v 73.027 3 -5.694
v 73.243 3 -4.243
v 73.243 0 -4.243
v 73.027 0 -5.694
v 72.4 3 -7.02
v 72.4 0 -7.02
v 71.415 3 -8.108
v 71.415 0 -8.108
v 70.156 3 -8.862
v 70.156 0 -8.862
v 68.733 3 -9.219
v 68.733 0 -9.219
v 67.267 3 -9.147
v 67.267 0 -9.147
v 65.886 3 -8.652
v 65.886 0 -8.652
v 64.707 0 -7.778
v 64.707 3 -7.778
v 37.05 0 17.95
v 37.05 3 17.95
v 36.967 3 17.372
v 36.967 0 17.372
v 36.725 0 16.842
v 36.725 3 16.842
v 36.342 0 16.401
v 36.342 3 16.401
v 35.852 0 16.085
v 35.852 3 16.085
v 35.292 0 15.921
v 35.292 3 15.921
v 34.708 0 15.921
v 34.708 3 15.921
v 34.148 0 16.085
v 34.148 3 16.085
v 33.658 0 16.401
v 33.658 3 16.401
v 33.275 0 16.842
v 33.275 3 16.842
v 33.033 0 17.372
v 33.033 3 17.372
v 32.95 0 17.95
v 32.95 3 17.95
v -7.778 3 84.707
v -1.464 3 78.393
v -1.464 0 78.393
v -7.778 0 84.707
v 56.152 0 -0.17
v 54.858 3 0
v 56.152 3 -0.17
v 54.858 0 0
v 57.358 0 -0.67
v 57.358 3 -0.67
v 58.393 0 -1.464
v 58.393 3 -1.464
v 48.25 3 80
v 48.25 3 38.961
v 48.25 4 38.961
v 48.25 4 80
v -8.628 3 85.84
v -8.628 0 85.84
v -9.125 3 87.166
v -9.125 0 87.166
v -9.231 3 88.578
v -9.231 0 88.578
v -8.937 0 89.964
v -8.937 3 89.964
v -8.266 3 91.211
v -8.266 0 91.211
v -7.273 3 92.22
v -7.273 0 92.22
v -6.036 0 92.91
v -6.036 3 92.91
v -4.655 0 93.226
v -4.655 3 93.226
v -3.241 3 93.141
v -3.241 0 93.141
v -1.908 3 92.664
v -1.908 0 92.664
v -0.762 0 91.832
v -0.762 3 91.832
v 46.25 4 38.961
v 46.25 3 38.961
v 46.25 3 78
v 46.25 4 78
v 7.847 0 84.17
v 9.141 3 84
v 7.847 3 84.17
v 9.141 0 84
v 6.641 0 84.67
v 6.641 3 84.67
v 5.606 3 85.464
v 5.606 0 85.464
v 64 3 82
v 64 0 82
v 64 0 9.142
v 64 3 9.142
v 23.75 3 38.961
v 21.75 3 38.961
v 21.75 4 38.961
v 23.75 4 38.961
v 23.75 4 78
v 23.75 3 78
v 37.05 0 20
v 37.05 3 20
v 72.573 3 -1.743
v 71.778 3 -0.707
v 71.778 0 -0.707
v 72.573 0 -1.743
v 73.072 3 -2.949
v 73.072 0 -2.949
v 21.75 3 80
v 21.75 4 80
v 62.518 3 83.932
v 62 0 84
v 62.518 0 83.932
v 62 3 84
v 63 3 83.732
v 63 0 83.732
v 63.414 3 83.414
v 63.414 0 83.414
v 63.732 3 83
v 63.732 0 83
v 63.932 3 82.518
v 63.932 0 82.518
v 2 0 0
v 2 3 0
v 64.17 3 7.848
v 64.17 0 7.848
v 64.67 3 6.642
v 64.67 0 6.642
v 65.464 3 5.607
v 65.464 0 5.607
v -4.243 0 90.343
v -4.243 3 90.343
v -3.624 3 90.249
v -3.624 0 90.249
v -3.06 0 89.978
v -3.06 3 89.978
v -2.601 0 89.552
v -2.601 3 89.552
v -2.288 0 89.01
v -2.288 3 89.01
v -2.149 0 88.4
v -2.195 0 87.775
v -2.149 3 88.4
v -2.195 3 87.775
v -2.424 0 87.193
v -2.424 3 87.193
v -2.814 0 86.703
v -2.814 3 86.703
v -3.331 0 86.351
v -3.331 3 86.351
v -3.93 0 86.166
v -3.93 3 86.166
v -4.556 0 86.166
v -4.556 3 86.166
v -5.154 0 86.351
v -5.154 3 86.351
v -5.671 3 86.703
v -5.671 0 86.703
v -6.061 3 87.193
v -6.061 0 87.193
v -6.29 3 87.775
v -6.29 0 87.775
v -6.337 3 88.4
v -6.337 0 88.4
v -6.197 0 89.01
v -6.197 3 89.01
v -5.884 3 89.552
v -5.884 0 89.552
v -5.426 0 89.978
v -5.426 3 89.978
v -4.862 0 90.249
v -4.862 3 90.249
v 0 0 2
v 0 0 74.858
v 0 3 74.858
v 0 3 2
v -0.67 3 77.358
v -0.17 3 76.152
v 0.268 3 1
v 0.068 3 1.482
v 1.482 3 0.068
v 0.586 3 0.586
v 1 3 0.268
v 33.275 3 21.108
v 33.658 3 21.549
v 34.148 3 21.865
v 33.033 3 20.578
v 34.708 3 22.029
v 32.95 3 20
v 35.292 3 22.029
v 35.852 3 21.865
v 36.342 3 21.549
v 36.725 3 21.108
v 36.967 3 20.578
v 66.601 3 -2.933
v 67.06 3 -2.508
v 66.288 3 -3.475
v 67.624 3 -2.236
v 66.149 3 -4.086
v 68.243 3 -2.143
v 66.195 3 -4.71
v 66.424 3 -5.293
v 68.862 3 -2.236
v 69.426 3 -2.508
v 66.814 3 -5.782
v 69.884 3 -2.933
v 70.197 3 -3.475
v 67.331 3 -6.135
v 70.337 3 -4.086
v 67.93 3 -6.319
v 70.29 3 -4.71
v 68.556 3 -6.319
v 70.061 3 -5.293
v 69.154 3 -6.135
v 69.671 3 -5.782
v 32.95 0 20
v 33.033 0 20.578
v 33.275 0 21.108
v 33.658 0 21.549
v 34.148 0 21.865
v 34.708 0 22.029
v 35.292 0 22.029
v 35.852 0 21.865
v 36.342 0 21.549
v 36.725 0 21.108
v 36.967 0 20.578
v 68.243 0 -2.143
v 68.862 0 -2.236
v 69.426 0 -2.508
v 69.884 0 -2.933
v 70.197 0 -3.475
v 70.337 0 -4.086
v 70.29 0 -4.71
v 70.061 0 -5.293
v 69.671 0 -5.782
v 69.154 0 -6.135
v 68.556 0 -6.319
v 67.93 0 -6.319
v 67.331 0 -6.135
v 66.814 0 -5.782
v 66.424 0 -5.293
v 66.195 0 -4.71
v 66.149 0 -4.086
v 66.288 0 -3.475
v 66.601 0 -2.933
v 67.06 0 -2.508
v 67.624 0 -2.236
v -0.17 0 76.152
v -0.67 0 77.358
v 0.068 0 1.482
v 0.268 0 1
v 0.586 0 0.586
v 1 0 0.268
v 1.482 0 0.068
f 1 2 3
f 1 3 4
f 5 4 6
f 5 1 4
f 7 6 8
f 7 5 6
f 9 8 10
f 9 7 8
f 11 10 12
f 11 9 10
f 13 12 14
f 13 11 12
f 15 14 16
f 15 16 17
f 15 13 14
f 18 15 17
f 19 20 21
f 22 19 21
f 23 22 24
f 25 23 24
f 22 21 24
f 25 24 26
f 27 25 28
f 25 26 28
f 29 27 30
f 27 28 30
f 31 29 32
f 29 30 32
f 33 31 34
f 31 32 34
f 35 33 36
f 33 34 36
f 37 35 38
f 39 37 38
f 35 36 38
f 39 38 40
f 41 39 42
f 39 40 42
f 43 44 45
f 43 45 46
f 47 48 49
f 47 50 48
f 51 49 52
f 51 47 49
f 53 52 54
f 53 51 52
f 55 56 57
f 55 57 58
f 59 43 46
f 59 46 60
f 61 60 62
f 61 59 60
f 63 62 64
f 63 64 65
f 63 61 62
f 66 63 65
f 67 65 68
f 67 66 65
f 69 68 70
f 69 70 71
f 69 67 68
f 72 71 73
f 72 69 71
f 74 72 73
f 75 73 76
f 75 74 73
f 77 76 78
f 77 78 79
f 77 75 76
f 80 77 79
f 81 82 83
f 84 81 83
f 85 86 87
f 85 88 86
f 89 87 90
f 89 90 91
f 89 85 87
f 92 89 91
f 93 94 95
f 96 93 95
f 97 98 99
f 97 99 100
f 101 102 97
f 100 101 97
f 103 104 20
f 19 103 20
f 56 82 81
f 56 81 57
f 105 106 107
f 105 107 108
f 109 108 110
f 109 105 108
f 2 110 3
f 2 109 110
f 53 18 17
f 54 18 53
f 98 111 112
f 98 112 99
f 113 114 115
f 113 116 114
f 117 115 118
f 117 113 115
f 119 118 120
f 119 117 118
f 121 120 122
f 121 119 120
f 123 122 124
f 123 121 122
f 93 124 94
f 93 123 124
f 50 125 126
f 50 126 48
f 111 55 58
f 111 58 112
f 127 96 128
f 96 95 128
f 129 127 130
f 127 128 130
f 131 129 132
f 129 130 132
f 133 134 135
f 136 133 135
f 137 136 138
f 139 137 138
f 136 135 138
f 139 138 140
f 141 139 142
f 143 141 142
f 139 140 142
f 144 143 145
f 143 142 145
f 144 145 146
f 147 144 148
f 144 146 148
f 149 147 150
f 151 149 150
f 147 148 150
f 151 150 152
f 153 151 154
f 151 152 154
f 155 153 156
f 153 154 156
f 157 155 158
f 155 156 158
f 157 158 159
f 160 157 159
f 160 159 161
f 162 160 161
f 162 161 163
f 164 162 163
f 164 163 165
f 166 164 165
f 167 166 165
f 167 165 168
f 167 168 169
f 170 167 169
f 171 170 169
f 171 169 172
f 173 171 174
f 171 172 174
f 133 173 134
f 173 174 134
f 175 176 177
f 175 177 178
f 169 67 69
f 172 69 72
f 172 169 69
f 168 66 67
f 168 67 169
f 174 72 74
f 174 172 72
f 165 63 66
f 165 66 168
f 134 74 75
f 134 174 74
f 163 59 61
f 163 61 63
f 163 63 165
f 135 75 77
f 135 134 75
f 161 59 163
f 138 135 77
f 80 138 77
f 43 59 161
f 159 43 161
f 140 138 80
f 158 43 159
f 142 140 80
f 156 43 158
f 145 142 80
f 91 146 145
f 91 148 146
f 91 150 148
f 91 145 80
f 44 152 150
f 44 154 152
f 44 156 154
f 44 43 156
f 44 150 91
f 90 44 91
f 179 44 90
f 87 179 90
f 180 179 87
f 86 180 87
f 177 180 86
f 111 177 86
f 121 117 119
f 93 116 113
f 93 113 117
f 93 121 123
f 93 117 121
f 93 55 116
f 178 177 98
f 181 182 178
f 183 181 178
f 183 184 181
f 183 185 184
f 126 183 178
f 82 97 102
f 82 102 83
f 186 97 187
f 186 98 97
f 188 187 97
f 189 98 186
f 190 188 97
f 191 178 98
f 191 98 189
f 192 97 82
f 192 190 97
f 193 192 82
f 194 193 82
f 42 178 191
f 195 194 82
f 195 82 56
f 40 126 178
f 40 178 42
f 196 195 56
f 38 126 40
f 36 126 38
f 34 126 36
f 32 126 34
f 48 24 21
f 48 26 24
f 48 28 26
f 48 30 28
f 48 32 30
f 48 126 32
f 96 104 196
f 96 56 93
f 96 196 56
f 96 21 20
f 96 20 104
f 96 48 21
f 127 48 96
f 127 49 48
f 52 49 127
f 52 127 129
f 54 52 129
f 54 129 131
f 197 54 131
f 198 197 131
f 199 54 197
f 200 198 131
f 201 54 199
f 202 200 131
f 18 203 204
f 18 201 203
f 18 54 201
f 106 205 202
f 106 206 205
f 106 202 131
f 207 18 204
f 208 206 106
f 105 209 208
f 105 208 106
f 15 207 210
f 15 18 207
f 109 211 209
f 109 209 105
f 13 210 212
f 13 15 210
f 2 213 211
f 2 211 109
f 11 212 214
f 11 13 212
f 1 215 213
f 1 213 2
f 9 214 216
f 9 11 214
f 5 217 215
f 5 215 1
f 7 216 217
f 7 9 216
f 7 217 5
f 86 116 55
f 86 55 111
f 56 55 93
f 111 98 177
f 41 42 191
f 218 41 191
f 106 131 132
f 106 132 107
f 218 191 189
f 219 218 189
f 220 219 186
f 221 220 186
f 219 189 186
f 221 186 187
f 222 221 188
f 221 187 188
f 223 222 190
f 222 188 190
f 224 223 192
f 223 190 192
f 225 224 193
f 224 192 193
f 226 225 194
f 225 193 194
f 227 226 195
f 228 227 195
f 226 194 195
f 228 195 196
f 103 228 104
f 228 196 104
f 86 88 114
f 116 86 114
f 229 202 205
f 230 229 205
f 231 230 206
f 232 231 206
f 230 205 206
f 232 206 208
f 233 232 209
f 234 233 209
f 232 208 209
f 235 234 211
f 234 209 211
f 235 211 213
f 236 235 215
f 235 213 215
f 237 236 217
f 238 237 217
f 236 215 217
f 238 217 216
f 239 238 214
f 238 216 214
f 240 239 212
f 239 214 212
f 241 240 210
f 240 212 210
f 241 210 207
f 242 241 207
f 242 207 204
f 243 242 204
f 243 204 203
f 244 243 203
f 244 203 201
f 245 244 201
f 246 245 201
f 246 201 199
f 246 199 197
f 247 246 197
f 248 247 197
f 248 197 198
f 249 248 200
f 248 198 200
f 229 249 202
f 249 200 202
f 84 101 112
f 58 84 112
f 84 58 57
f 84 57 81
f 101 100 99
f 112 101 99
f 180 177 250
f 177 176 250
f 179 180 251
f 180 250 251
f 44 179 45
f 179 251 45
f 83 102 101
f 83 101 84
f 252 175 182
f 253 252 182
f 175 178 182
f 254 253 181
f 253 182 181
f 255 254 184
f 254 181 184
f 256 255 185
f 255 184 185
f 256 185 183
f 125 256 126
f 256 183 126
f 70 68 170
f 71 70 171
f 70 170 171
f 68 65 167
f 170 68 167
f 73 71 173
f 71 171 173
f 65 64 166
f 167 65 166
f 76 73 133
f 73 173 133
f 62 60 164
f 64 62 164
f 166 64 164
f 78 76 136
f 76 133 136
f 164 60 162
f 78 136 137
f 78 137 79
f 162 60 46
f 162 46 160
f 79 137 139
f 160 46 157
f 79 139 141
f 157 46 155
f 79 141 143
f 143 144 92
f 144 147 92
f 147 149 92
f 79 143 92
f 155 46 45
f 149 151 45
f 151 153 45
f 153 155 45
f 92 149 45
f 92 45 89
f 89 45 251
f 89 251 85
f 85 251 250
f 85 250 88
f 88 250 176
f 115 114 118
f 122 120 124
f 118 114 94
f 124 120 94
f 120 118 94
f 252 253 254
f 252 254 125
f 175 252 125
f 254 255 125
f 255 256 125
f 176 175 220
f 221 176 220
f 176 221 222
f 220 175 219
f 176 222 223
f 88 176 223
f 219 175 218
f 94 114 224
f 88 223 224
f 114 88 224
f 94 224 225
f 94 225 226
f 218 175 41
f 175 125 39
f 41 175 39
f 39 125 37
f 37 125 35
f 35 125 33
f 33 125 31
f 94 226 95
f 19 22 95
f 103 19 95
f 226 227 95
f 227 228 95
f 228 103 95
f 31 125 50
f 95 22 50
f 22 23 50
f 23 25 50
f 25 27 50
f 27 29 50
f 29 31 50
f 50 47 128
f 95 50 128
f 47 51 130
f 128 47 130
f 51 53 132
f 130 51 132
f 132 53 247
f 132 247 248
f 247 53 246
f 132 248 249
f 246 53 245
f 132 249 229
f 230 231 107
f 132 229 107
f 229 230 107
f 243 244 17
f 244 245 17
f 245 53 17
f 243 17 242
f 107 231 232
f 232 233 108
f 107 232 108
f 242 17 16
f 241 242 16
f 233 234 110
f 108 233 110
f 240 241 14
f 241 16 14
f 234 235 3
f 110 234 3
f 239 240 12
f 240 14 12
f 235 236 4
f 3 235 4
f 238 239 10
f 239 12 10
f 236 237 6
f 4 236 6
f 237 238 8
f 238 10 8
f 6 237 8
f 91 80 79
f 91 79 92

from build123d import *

# Parameters (mm, degrees)
SKETCH1_W             = 64
SKETCH1_H             = 84
BOSS_EXTRUDE1_DEPTH   = 3
BOSS_EXTRUDE2_DEPTH   = 1
SKETCH3_R             = 2.1
BOSS_EXTRUDE3_DEPTH   = 3
BOSS_EXTRUDE3_2_DEPTH = 3
FILLET3_R             = 5
FILLET4_R             = 2
CUT_EXTRUDE1_DEPTH    = 10


with BuildPart() as part:
    # Sketch1 → Boss-Extrude1 (new body)
    with BuildSketch(Plane(origin=(0, 0, 0), x_dir=(1, 0, 0), z_dir=(0, 1, 0))):
        with Locations((32, -42)):
            Rectangle(SKETCH1_W, SKETCH1_H)
    extrude(amount=BOSS_EXTRUDE1_DEPTH)

    # Sketch2 → Boss-Extrude2 (add)
    with BuildSketch(Plane(origin=(0, 3, 0), x_dir=(1, 0, 0), z_dir=(0, 1, 0))):
        Polygon((23.75, -68.961175578), (23.75, -78), (46.25, -78), (46.25, -68.961175578), (46.25, -38.961175578), (48.25, -38.961175578), (48.25, -80), (21.75, -80), (21.75, -38.961175578), (23.75, -38.961175578), align=None)
    extrude(amount=BOSS_EXTRUDE2_DEPTH)


with BuildPart() as body_2:
    # Sketch3 → Boss-Extrude3 (new body)
    with BuildSketch(Plane(origin=(0, 3, 0), x_dir=(1, 0, 0), z_dir=(0, 1, 0))):
        with BuildLine():
            Line((0, -76.928932188), (-7.778174593, -84.707106781))
            ThreePointArc((-7.778174593, -84.707106781), (-7.805302944, -91.750836469), (-0.76199118, -91.832219912))
            Line((-0.76199118, -91.832219912), (7.070228732, -84))
            Line((7.070228732, -84), (0, -76.928932188))
        make_face()
        with Locations((-4.242640687, -88.242640687)):
            Circle(SKETCH3_R, mode=Mode.SUBTRACT)
    extrude(amount=-BOSS_EXTRUDE3_DEPTH)


with BuildPart() as body_3:
    # Sketch3 → Boss-Extrude3 2 (new body)
    with BuildSketch(Plane(origin=(0, 3, 0), x_dir=(1, 0, 0), z_dir=(0, 1, 0))):
        with BuildLine():
            Line((56.928932188, 0), (64, -7.071067812))
            Line((64, -7.071067812), (71.778174593, 0.707106781))
            ThreePointArc((71.778174593, 0.707106781), (71.778174593, 7.778174593), (64.707106781, 7.778174593))
            Line((64.707106781, 7.778174593), (56.928932188, 0))
        make_face()
        with Locations((68.242640687, 4.242640687)):
            Circle(SKETCH3_R, mode=Mode.SUBTRACT)
    extrude(amount=-BOSS_EXTRUDE3_2_DEPTH)


with BuildPart() as body_2_1:
    add(body_2.part)

    # Combine2: union part, body 3
    add(part.part)
    add(body_3.part)

    # Fillet3
    fillet3_edges = [body_2_1.edges().sort_by_distance(p)[0] for p in [
        (64, 1.5, 7.071067812),
        (56.928932188, 1.5, 0),
        (0, 1.5, 76.928932188),
        (7.070228732, 1.5, 84),
    ]]
    fillet(fillet3_edges, radius=FILLET3_R)

    # Fillet4
    fillet4_edges = [body_2_1.edges().sort_by_distance(p)[0] for p in [
        (0, 1.5, 0),
        (64, 1.5, 84),
    ]]
    fillet(fillet4_edges, radius=FILLET4_R)

    # Sketch4 → Cut-Extrude1 (cut)
    with BuildSketch(Plane(origin=(0, 3, 0), x_dir=(1, 0, 0), z_dir=(0, 1, 0))):
        with BuildLine():
            Line((32.95, -17.95), (32.95, -20))
            ThreePointArc((32.95, -20), (35, -22.05), (37.05, -20))
            Line((37.05, -20), (37.05, -17.95))
            ThreePointArc((37.05, -17.95), (35, -15.9), (32.95, -17.95))
        make_face()
    extrude(amount=-CUT_EXTRUDE1_DEPTH, mode=Mode.SUBTRACT)


solid = body_2_1.part
